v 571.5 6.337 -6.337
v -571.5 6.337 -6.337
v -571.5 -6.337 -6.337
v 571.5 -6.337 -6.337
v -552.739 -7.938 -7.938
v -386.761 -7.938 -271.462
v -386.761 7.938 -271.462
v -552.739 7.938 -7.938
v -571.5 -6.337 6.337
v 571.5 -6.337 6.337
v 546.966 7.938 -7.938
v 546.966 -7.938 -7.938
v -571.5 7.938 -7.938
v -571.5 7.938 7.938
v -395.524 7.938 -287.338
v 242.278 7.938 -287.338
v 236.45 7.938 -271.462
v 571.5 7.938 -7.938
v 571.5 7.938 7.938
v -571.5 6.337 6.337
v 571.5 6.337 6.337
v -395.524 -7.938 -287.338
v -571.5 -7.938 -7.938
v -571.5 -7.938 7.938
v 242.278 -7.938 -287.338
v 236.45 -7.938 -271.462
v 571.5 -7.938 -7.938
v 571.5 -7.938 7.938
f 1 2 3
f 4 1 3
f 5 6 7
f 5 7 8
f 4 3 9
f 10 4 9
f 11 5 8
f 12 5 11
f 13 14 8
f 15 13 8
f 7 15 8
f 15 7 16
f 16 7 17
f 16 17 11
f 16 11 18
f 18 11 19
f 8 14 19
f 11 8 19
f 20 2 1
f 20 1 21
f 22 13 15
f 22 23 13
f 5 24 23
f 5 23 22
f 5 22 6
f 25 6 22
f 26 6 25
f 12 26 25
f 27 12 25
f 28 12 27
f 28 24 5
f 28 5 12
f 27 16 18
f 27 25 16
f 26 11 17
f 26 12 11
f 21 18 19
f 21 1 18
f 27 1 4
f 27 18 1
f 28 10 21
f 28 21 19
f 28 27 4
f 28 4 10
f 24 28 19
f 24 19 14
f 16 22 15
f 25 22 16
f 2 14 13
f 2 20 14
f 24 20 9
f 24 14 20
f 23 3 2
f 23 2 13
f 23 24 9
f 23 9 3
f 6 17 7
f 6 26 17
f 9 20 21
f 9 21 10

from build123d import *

# Parameters (mm, degrees)
F1_DEPTH      = 7.9375
F2_W          = 12.6746
F2_H          = 12.6746
F3_DEPTH      = 1143.001
F3_DEPTH_BACK = 1751


# Not quite as in the source:
# - an extrude ends at something that could not be found from the text; its depth is read off the source's solid


with BuildPart() as f1:
    # F0 (on Front) → F1 (new body, symmetric)
    with BuildSketch(Plane.XZ):
        Polygon((242.2783725209, -287.3375), (571.5, -7.9375), (571.5, 7.9375), (-571.5, 7.9375), (-571.5, -7.9375), (-395.523637951, -287.3375), align=None)
        Polygon((-386.7609312492, -271.4625), (-552.7386363636, -7.9375), (546.9659090909, -7.9375), (236.4500559004, -271.4625), align=None, mode=Mode.SUBTRACT)
    extrude(amount=F1_DEPTH, both=True)

    # F2 (on face) → F3 (cut, two sides)
    with BuildSketch(Plane(origin=(-571.5, 0, 0), x_dir=(0, -1, 0), z_dir=(-1, 0, 0))) as f3_sk:
        Rectangle(F2_W, F2_H)
    extrude(amount=-F3_DEPTH, mode=Mode.SUBTRACT)
    extrude(f3_sk.sketch, amount=F3_DEPTH_BACK, mode=Mode.SUBTRACT)


solid = f1.part
